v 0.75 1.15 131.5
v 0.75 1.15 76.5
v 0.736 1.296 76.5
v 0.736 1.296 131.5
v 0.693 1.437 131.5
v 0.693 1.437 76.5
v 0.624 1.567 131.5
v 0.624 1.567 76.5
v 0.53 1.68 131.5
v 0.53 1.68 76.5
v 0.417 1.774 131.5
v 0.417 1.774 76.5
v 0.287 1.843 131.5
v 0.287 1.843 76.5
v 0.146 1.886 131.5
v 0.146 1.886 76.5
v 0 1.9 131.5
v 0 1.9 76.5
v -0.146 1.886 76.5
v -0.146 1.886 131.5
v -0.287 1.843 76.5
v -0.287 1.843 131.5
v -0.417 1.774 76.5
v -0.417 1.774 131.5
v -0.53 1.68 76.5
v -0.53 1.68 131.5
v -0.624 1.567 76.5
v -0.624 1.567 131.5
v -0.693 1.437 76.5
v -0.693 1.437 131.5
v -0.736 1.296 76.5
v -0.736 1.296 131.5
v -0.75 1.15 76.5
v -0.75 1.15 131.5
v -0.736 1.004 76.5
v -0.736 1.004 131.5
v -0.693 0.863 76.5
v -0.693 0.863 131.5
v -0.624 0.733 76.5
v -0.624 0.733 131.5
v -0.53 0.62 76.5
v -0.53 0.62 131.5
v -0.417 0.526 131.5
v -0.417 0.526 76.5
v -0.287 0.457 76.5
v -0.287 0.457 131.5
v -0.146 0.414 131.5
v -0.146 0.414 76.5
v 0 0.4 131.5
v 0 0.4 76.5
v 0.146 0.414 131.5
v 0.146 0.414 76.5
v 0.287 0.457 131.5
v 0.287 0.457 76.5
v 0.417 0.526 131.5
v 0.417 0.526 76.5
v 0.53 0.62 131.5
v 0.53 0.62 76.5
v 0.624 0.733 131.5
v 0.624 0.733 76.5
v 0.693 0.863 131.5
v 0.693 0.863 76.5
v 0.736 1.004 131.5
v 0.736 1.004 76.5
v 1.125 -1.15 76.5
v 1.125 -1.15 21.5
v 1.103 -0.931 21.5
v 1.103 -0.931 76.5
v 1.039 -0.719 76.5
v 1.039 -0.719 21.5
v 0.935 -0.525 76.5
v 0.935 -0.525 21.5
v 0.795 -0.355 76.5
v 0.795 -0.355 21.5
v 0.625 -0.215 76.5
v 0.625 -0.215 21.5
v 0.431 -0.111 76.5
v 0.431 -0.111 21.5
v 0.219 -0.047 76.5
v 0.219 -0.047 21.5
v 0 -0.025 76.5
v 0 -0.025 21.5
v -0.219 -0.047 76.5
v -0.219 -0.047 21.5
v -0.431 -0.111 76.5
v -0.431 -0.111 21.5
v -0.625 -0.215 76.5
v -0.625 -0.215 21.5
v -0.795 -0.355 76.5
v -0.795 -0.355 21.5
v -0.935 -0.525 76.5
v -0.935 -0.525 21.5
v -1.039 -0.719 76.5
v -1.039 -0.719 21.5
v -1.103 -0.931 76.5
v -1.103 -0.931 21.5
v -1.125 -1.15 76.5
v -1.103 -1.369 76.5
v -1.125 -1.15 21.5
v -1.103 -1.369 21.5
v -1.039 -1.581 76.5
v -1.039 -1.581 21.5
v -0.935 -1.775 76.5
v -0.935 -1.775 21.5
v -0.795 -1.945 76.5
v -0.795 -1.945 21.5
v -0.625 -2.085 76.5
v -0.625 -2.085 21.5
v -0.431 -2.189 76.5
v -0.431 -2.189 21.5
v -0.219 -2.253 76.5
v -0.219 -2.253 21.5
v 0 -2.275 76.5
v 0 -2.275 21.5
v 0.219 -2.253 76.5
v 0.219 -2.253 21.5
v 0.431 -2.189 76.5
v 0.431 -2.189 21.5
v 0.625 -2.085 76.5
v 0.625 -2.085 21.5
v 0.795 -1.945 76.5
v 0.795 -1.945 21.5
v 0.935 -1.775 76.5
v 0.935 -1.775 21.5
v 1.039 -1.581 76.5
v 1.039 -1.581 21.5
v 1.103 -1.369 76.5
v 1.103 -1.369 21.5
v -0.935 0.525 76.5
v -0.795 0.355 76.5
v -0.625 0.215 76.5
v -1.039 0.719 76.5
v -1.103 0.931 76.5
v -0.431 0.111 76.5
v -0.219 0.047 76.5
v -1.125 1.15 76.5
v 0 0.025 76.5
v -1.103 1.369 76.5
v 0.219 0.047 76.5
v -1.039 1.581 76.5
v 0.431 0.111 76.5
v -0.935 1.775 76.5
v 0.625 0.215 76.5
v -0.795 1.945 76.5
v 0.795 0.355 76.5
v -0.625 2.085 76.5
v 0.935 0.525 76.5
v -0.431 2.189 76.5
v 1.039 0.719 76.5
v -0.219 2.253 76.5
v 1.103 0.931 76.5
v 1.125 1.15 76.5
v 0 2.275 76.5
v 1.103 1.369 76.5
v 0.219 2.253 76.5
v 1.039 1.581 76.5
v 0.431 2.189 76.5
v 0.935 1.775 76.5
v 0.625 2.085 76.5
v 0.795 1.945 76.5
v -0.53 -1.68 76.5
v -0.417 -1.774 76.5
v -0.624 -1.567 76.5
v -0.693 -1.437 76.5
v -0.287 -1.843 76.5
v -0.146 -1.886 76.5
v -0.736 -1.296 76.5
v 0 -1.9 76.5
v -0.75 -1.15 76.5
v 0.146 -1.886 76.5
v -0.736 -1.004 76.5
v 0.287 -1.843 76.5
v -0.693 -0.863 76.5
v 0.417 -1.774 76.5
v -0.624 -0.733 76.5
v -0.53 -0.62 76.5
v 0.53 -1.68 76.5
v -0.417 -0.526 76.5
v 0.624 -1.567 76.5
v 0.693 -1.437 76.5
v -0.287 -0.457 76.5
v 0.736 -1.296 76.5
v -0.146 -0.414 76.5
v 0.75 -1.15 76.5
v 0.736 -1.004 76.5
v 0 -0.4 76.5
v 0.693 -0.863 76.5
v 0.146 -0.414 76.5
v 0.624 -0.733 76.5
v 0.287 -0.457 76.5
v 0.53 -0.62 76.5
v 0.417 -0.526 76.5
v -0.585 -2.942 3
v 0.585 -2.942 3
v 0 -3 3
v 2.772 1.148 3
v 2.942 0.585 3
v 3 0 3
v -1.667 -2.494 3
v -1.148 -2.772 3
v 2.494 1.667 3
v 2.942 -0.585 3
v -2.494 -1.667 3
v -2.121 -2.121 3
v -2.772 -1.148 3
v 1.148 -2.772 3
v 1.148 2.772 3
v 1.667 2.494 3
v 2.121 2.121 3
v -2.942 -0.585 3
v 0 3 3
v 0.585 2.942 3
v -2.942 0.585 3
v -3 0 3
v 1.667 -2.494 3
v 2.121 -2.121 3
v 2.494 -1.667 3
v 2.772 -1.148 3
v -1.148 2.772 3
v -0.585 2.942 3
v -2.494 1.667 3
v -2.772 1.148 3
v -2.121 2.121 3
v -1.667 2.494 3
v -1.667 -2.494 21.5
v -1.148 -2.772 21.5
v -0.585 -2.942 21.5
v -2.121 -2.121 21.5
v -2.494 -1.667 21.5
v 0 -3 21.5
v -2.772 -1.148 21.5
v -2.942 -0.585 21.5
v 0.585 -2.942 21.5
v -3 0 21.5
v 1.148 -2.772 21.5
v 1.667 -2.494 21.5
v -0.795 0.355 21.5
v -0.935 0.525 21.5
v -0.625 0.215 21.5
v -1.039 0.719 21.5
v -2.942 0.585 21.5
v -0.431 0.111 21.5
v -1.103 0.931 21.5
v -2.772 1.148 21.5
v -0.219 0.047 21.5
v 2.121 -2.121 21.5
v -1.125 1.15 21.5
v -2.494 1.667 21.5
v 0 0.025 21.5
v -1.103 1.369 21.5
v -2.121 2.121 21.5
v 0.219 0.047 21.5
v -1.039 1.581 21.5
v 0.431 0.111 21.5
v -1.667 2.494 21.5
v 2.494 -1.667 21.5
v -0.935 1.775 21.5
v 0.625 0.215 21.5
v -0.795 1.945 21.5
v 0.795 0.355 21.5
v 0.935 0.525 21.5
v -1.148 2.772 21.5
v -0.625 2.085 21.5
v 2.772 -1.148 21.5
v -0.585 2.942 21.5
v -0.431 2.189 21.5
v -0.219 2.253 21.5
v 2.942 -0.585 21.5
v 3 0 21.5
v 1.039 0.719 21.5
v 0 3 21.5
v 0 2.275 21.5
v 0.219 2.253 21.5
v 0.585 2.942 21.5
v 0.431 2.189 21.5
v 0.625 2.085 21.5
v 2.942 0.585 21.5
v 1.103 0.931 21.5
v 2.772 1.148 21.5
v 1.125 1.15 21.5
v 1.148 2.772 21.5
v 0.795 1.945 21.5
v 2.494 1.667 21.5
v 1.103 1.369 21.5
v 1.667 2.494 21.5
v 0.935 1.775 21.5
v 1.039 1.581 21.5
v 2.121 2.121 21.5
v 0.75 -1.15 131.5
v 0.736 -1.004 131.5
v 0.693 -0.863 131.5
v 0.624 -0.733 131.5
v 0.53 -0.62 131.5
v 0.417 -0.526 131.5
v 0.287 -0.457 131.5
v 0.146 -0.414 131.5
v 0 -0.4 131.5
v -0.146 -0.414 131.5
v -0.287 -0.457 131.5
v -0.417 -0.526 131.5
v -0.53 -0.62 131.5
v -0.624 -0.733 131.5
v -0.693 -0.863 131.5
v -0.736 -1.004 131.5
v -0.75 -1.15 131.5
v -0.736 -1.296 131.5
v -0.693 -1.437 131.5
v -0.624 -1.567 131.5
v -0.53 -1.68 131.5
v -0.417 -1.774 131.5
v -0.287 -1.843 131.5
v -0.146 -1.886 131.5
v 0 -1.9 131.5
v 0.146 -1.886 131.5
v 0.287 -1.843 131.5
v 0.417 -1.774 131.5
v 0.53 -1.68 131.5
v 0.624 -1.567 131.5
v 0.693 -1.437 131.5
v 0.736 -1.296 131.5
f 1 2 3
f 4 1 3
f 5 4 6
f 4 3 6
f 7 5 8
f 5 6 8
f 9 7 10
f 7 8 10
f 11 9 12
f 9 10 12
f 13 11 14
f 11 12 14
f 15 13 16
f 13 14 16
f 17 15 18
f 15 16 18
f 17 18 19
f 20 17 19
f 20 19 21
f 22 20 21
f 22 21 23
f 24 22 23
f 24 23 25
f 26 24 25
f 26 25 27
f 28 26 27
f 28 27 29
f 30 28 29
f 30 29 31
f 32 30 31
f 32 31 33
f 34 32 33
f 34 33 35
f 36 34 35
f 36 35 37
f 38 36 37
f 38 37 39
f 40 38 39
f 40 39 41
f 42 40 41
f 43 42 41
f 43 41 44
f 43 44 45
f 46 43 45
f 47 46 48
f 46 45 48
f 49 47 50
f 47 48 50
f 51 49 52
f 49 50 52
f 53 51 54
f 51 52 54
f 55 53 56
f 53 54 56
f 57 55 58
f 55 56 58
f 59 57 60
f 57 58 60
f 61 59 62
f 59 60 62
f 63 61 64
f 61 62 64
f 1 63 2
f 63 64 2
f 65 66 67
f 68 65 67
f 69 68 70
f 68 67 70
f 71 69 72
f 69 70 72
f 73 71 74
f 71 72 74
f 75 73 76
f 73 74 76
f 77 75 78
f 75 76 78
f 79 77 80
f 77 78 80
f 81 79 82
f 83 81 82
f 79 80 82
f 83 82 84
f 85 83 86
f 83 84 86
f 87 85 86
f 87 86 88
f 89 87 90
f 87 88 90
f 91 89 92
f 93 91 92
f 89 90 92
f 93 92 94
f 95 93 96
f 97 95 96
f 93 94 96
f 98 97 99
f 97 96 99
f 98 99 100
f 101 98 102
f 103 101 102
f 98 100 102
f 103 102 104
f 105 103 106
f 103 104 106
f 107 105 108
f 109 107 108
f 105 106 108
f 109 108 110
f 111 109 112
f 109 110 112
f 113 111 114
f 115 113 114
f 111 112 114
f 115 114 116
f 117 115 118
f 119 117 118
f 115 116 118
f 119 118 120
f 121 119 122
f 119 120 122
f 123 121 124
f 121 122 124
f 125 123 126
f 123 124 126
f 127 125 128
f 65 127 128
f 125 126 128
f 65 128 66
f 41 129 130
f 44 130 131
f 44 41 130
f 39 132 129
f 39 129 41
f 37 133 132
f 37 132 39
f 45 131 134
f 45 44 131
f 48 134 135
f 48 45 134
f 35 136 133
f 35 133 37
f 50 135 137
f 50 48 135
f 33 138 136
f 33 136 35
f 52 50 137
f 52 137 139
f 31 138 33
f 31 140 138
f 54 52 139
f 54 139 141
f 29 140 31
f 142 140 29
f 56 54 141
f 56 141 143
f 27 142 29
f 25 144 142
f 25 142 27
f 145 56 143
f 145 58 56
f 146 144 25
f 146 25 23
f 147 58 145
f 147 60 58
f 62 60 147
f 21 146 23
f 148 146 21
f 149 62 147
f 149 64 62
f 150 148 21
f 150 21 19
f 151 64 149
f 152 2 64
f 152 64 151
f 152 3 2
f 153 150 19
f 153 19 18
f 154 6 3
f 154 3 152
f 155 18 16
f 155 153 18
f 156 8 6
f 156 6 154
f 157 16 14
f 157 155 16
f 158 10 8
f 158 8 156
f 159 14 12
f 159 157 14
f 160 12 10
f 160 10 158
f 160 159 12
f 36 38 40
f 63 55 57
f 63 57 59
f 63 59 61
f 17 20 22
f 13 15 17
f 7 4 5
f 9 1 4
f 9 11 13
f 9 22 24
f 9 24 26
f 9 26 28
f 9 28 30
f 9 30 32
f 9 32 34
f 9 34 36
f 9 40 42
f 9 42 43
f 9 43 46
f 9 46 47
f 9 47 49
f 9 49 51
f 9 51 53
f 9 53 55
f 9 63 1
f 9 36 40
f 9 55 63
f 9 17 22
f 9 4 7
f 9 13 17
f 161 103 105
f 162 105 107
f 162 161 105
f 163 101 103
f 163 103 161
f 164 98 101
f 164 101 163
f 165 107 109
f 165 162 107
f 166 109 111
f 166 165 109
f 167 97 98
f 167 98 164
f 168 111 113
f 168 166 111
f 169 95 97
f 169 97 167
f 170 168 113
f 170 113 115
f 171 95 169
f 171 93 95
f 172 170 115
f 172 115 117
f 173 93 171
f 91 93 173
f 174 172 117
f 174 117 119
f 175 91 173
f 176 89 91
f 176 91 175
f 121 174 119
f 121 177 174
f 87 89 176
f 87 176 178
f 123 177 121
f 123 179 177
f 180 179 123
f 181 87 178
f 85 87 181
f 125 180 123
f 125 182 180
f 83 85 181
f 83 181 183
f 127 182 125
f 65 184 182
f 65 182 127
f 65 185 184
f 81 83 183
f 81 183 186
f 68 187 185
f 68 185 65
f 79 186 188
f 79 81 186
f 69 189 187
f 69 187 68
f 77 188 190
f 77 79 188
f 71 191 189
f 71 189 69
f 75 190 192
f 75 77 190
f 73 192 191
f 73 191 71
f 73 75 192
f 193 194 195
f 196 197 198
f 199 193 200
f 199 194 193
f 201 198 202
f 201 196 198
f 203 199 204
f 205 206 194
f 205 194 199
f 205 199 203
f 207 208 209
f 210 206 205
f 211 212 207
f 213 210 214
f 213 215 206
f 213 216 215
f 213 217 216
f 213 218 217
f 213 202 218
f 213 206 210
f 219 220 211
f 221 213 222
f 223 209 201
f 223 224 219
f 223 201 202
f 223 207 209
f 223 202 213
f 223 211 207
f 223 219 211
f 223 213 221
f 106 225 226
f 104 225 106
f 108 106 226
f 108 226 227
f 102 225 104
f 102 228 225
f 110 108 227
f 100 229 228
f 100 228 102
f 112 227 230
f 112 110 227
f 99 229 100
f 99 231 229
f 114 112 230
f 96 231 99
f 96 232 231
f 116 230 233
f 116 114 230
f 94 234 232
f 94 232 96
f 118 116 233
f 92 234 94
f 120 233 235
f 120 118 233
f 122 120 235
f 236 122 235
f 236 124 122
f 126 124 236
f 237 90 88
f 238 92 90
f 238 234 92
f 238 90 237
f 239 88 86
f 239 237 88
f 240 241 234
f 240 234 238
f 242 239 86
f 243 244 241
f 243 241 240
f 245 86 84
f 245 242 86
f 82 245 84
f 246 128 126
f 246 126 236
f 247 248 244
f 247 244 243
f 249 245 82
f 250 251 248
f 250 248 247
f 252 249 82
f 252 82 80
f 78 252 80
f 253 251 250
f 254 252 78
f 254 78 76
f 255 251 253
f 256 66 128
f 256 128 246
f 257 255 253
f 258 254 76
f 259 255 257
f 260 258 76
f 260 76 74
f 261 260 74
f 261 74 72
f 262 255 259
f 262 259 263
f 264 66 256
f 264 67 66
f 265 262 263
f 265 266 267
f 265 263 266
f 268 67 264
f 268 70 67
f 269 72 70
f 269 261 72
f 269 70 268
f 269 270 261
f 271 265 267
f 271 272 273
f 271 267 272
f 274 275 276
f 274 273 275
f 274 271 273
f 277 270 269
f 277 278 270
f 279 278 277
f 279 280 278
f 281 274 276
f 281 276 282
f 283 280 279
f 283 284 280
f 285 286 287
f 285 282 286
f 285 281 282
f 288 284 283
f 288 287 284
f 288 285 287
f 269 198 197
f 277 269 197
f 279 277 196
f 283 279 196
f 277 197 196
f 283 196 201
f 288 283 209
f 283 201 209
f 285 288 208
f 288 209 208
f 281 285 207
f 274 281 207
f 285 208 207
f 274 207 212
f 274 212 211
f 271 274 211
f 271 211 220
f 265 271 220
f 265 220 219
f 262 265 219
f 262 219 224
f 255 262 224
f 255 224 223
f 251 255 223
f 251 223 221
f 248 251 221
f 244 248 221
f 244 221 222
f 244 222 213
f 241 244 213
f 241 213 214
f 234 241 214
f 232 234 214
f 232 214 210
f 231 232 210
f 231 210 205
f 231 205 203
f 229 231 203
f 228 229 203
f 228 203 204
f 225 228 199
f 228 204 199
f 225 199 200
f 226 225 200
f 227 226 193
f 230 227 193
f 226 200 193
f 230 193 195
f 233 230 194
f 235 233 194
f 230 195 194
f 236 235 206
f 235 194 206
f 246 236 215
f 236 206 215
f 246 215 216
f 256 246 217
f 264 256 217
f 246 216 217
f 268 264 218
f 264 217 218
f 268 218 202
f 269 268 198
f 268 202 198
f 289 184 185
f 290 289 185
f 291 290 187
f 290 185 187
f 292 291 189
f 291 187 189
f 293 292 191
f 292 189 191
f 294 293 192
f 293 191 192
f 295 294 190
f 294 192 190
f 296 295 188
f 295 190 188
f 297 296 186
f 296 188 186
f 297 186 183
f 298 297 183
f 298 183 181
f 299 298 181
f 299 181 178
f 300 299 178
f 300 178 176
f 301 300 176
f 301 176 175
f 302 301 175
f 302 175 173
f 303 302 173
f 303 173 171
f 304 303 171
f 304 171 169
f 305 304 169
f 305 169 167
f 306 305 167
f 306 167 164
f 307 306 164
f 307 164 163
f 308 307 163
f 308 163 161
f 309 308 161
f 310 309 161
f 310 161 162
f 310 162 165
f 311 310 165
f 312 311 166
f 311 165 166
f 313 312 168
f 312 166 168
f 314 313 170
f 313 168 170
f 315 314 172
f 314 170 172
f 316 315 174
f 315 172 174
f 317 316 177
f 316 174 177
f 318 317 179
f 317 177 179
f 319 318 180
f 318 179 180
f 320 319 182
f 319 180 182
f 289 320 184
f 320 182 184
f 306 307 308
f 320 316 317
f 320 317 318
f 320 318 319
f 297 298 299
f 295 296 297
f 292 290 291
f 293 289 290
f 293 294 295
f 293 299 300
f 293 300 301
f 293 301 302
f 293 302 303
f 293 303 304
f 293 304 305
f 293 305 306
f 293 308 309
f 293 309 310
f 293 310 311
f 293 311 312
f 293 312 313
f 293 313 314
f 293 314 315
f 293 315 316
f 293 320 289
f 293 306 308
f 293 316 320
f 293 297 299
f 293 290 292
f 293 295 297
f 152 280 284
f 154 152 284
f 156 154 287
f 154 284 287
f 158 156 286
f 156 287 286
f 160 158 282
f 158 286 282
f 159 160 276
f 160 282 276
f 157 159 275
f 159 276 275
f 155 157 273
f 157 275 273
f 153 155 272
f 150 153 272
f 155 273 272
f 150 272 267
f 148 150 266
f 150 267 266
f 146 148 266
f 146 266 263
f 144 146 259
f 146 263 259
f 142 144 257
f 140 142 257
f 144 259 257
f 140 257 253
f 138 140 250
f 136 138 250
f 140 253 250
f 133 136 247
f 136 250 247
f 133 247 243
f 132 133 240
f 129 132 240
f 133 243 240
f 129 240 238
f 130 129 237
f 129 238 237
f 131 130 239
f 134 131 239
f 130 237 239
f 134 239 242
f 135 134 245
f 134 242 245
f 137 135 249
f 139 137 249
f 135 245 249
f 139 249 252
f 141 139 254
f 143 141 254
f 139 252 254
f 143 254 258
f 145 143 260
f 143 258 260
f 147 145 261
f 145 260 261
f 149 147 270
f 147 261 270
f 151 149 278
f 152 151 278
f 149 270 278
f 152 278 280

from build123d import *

# Parameters (mm, degrees)
CROQUIS1_R                   = 3
SALIENTE_EXTRUIR1_DEPTH      = 18
SALIENTE_EXTRUIR2_DEPTH      = 21.5
SALIENTE_EXTRUIR2_DEPTH_BACK = 1.5
CROQUIS1_2_R                 = 3
CROQUIS3_R                   = 3
CORTAR_EXTRUIR1_DEPTH        = 4.5
CROQUIS9_R                   = 1.125
SALIENTE_EXTRUIR3_DEPTH      = 55
CROQUIS10_R                  = 0.75
SALIENTE_EXTRUIR4_DEPTH      = 110


with BuildPart() as part:
    # Croquis1 → Saliente-Extruir1 (new body)
    with BuildSketch(Plane.XY):
        Circle(CROQUIS1_R)
    extrude(amount=SALIENTE_EXTRUIR1_DEPTH)

    # Croquis1<2> → Saliente-Extruir2 (add, two sides: drawn at the far end of the back side and taken through both)
    with BuildSketch(Plane.XY.offset(-SALIENTE_EXTRUIR2_DEPTH_BACK)):
        Circle(CROQUIS1_2_R)
    extrude(amount=SALIENTE_EXTRUIR2_DEPTH + SALIENTE_EXTRUIR2_DEPTH_BACK)

    # Croquis3 → Cortar-Extruir1 (cut)
    with BuildSketch(Plane(origin=(0, 0, -1.5), x_dir=(-1, 0, 0), z_dir=(0, 0, -1))):
        Circle(CROQUIS3_R)
    extrude(amount=-CORTAR_EXTRUIR1_DEPTH, mode=Mode.SUBTRACT)

    # Croquis9 → Saliente-Extruir3 (add)
    with BuildSketch(Plane.XY.offset(21.5)):
        with Locations((0, -1.15)):
            Circle(CROQUIS9_R)
        with Locations((0, 1.15)):
            Circle(CROQUIS9_R)
    extrude(amount=SALIENTE_EXTRUIR3_DEPTH)

    # Croquis10 → Saliente-Extruir4 (add)
    with BuildSketch(Plane.XY.offset(21.5)):
        with Locations((0, -1.15)):
            Circle(CROQUIS10_R)
        with Locations((0, 1.15)):
            Circle(CROQUIS10_R)
    extrude(amount=SALIENTE_EXTRUIR4_DEPTH)


solid = part.part
